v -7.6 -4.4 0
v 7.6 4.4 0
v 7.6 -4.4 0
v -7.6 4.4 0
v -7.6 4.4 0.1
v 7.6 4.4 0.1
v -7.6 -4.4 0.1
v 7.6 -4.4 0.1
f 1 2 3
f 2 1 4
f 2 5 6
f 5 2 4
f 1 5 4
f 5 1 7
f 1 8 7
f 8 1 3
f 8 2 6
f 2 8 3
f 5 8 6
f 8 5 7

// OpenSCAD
// file: ../p/box5-12.scad
use <../lib.scad>
function ldraw_lib__box5_12() = [
// 0 Box with 5 Faces without Any Edges
// 0 Name: box5-12.dat
// 0 Author: Chris Dee [cwdee]
// 0 !LDRAW_ORG Primitive UPDATE 2009-02
// 0 !LICENSE Licensed under CC BY 4.0 : see CAreadme.txt
// 
// 0 BFC CERTIFY CCW
  [0,"BFC","CERTIFY"],
  [0,"BFC","CCW"],
// 
// 0 !HISTORY 2009-09-03 [PTadmin] Official Update 2009-02
// 
// 
// 4 16 1 1 1 1 1 -1 -1 1 -1 -1 1 1
  [4,16,1,1,1,1,1,-1,-1,1,-1,-1,1,1],
// 4 16 -1 0 1 1 0 1 1 1 1 -1 1 1
  [4,16,-1,0,1,1,0,1,1,1,1,-1,1,1],
// 4 16 -1 0 -1 -1 0 1 -1 1 1 -1 1 -1
  [4,16,-1,0,-1,-1,0,1,-1,1,1,-1,1,-1],
// 4 16 1 0 -1 -1 0 -1 -1 1 -1 1 1 -1
  [4,16,1,0,-1,-1,0,-1,-1,1,-1,1,1,-1],
// 4 16 1 0 1 1 0 -1 1 1 -1 1 1 1
  [4,16,1,0,1,1,0,-1,1,1,-1,1,1,1],
// 0
];
module ldraw_lib__box5_12(step=0, col=false, unit=2/5, alt=false, line=0.2, solid=!$preview)
    makepoly(ldraw_lib__box5_12(), step=step, col=col, unit=unit, alt=alt, line=line, solid=solid);
ldraw_lib__box5_12(line=0.2);
// main file
use <../lib.scad>
use <../p/box5-12.scad>
function ldraw_lib__191485q() = [
// 0 Sticker  1.1 x  1.9 Black
// 0 Name: 191485q.dat
// 0 Author: Rene Rechthaler [Blechtaler]
// 0 !LDRAW_ORG Part UPDATE 2023-06
// 0 !LICENSE Licensed under CC BY 4.0 : see CAreadme.txt
// 
// 0 BFC CERTIFY CCW
  [0,"BFC","CERTIFY"],
  [0,"BFC","CCW"],
// 
// 0 !KEYWORDS Set 1554
// 
// 0 !HISTORY 2023-11-19 [OrionP] Official Update 2023-06
// 
// 
// 1 16 0 -.25 0 19 0 0 0 .25 0 0 0 11 box5-12.dat
  [1,16,0,-.25,0,19,0,0,0,.25,0,0,0,11, ldraw_lib__box5_12()],
// 
// 4 0 -19 -.25 11 -19 -.25 -11 19 -.25 -11 19 -.25 11
  [4,0,-19,-.25,11,-19,-.25,-11,19,-.25,-11,19,-.25,11],
];
module ldraw_lib__191485q(step=0, col=false, unit=2/5, alt=false, line=0.2, solid=!$preview)
    makepoly(ldraw_lib__191485q(), step=step, col=col, unit=unit, alt=alt, line=line, solid=solid);
ldraw_lib__191485q(line=0.2);
